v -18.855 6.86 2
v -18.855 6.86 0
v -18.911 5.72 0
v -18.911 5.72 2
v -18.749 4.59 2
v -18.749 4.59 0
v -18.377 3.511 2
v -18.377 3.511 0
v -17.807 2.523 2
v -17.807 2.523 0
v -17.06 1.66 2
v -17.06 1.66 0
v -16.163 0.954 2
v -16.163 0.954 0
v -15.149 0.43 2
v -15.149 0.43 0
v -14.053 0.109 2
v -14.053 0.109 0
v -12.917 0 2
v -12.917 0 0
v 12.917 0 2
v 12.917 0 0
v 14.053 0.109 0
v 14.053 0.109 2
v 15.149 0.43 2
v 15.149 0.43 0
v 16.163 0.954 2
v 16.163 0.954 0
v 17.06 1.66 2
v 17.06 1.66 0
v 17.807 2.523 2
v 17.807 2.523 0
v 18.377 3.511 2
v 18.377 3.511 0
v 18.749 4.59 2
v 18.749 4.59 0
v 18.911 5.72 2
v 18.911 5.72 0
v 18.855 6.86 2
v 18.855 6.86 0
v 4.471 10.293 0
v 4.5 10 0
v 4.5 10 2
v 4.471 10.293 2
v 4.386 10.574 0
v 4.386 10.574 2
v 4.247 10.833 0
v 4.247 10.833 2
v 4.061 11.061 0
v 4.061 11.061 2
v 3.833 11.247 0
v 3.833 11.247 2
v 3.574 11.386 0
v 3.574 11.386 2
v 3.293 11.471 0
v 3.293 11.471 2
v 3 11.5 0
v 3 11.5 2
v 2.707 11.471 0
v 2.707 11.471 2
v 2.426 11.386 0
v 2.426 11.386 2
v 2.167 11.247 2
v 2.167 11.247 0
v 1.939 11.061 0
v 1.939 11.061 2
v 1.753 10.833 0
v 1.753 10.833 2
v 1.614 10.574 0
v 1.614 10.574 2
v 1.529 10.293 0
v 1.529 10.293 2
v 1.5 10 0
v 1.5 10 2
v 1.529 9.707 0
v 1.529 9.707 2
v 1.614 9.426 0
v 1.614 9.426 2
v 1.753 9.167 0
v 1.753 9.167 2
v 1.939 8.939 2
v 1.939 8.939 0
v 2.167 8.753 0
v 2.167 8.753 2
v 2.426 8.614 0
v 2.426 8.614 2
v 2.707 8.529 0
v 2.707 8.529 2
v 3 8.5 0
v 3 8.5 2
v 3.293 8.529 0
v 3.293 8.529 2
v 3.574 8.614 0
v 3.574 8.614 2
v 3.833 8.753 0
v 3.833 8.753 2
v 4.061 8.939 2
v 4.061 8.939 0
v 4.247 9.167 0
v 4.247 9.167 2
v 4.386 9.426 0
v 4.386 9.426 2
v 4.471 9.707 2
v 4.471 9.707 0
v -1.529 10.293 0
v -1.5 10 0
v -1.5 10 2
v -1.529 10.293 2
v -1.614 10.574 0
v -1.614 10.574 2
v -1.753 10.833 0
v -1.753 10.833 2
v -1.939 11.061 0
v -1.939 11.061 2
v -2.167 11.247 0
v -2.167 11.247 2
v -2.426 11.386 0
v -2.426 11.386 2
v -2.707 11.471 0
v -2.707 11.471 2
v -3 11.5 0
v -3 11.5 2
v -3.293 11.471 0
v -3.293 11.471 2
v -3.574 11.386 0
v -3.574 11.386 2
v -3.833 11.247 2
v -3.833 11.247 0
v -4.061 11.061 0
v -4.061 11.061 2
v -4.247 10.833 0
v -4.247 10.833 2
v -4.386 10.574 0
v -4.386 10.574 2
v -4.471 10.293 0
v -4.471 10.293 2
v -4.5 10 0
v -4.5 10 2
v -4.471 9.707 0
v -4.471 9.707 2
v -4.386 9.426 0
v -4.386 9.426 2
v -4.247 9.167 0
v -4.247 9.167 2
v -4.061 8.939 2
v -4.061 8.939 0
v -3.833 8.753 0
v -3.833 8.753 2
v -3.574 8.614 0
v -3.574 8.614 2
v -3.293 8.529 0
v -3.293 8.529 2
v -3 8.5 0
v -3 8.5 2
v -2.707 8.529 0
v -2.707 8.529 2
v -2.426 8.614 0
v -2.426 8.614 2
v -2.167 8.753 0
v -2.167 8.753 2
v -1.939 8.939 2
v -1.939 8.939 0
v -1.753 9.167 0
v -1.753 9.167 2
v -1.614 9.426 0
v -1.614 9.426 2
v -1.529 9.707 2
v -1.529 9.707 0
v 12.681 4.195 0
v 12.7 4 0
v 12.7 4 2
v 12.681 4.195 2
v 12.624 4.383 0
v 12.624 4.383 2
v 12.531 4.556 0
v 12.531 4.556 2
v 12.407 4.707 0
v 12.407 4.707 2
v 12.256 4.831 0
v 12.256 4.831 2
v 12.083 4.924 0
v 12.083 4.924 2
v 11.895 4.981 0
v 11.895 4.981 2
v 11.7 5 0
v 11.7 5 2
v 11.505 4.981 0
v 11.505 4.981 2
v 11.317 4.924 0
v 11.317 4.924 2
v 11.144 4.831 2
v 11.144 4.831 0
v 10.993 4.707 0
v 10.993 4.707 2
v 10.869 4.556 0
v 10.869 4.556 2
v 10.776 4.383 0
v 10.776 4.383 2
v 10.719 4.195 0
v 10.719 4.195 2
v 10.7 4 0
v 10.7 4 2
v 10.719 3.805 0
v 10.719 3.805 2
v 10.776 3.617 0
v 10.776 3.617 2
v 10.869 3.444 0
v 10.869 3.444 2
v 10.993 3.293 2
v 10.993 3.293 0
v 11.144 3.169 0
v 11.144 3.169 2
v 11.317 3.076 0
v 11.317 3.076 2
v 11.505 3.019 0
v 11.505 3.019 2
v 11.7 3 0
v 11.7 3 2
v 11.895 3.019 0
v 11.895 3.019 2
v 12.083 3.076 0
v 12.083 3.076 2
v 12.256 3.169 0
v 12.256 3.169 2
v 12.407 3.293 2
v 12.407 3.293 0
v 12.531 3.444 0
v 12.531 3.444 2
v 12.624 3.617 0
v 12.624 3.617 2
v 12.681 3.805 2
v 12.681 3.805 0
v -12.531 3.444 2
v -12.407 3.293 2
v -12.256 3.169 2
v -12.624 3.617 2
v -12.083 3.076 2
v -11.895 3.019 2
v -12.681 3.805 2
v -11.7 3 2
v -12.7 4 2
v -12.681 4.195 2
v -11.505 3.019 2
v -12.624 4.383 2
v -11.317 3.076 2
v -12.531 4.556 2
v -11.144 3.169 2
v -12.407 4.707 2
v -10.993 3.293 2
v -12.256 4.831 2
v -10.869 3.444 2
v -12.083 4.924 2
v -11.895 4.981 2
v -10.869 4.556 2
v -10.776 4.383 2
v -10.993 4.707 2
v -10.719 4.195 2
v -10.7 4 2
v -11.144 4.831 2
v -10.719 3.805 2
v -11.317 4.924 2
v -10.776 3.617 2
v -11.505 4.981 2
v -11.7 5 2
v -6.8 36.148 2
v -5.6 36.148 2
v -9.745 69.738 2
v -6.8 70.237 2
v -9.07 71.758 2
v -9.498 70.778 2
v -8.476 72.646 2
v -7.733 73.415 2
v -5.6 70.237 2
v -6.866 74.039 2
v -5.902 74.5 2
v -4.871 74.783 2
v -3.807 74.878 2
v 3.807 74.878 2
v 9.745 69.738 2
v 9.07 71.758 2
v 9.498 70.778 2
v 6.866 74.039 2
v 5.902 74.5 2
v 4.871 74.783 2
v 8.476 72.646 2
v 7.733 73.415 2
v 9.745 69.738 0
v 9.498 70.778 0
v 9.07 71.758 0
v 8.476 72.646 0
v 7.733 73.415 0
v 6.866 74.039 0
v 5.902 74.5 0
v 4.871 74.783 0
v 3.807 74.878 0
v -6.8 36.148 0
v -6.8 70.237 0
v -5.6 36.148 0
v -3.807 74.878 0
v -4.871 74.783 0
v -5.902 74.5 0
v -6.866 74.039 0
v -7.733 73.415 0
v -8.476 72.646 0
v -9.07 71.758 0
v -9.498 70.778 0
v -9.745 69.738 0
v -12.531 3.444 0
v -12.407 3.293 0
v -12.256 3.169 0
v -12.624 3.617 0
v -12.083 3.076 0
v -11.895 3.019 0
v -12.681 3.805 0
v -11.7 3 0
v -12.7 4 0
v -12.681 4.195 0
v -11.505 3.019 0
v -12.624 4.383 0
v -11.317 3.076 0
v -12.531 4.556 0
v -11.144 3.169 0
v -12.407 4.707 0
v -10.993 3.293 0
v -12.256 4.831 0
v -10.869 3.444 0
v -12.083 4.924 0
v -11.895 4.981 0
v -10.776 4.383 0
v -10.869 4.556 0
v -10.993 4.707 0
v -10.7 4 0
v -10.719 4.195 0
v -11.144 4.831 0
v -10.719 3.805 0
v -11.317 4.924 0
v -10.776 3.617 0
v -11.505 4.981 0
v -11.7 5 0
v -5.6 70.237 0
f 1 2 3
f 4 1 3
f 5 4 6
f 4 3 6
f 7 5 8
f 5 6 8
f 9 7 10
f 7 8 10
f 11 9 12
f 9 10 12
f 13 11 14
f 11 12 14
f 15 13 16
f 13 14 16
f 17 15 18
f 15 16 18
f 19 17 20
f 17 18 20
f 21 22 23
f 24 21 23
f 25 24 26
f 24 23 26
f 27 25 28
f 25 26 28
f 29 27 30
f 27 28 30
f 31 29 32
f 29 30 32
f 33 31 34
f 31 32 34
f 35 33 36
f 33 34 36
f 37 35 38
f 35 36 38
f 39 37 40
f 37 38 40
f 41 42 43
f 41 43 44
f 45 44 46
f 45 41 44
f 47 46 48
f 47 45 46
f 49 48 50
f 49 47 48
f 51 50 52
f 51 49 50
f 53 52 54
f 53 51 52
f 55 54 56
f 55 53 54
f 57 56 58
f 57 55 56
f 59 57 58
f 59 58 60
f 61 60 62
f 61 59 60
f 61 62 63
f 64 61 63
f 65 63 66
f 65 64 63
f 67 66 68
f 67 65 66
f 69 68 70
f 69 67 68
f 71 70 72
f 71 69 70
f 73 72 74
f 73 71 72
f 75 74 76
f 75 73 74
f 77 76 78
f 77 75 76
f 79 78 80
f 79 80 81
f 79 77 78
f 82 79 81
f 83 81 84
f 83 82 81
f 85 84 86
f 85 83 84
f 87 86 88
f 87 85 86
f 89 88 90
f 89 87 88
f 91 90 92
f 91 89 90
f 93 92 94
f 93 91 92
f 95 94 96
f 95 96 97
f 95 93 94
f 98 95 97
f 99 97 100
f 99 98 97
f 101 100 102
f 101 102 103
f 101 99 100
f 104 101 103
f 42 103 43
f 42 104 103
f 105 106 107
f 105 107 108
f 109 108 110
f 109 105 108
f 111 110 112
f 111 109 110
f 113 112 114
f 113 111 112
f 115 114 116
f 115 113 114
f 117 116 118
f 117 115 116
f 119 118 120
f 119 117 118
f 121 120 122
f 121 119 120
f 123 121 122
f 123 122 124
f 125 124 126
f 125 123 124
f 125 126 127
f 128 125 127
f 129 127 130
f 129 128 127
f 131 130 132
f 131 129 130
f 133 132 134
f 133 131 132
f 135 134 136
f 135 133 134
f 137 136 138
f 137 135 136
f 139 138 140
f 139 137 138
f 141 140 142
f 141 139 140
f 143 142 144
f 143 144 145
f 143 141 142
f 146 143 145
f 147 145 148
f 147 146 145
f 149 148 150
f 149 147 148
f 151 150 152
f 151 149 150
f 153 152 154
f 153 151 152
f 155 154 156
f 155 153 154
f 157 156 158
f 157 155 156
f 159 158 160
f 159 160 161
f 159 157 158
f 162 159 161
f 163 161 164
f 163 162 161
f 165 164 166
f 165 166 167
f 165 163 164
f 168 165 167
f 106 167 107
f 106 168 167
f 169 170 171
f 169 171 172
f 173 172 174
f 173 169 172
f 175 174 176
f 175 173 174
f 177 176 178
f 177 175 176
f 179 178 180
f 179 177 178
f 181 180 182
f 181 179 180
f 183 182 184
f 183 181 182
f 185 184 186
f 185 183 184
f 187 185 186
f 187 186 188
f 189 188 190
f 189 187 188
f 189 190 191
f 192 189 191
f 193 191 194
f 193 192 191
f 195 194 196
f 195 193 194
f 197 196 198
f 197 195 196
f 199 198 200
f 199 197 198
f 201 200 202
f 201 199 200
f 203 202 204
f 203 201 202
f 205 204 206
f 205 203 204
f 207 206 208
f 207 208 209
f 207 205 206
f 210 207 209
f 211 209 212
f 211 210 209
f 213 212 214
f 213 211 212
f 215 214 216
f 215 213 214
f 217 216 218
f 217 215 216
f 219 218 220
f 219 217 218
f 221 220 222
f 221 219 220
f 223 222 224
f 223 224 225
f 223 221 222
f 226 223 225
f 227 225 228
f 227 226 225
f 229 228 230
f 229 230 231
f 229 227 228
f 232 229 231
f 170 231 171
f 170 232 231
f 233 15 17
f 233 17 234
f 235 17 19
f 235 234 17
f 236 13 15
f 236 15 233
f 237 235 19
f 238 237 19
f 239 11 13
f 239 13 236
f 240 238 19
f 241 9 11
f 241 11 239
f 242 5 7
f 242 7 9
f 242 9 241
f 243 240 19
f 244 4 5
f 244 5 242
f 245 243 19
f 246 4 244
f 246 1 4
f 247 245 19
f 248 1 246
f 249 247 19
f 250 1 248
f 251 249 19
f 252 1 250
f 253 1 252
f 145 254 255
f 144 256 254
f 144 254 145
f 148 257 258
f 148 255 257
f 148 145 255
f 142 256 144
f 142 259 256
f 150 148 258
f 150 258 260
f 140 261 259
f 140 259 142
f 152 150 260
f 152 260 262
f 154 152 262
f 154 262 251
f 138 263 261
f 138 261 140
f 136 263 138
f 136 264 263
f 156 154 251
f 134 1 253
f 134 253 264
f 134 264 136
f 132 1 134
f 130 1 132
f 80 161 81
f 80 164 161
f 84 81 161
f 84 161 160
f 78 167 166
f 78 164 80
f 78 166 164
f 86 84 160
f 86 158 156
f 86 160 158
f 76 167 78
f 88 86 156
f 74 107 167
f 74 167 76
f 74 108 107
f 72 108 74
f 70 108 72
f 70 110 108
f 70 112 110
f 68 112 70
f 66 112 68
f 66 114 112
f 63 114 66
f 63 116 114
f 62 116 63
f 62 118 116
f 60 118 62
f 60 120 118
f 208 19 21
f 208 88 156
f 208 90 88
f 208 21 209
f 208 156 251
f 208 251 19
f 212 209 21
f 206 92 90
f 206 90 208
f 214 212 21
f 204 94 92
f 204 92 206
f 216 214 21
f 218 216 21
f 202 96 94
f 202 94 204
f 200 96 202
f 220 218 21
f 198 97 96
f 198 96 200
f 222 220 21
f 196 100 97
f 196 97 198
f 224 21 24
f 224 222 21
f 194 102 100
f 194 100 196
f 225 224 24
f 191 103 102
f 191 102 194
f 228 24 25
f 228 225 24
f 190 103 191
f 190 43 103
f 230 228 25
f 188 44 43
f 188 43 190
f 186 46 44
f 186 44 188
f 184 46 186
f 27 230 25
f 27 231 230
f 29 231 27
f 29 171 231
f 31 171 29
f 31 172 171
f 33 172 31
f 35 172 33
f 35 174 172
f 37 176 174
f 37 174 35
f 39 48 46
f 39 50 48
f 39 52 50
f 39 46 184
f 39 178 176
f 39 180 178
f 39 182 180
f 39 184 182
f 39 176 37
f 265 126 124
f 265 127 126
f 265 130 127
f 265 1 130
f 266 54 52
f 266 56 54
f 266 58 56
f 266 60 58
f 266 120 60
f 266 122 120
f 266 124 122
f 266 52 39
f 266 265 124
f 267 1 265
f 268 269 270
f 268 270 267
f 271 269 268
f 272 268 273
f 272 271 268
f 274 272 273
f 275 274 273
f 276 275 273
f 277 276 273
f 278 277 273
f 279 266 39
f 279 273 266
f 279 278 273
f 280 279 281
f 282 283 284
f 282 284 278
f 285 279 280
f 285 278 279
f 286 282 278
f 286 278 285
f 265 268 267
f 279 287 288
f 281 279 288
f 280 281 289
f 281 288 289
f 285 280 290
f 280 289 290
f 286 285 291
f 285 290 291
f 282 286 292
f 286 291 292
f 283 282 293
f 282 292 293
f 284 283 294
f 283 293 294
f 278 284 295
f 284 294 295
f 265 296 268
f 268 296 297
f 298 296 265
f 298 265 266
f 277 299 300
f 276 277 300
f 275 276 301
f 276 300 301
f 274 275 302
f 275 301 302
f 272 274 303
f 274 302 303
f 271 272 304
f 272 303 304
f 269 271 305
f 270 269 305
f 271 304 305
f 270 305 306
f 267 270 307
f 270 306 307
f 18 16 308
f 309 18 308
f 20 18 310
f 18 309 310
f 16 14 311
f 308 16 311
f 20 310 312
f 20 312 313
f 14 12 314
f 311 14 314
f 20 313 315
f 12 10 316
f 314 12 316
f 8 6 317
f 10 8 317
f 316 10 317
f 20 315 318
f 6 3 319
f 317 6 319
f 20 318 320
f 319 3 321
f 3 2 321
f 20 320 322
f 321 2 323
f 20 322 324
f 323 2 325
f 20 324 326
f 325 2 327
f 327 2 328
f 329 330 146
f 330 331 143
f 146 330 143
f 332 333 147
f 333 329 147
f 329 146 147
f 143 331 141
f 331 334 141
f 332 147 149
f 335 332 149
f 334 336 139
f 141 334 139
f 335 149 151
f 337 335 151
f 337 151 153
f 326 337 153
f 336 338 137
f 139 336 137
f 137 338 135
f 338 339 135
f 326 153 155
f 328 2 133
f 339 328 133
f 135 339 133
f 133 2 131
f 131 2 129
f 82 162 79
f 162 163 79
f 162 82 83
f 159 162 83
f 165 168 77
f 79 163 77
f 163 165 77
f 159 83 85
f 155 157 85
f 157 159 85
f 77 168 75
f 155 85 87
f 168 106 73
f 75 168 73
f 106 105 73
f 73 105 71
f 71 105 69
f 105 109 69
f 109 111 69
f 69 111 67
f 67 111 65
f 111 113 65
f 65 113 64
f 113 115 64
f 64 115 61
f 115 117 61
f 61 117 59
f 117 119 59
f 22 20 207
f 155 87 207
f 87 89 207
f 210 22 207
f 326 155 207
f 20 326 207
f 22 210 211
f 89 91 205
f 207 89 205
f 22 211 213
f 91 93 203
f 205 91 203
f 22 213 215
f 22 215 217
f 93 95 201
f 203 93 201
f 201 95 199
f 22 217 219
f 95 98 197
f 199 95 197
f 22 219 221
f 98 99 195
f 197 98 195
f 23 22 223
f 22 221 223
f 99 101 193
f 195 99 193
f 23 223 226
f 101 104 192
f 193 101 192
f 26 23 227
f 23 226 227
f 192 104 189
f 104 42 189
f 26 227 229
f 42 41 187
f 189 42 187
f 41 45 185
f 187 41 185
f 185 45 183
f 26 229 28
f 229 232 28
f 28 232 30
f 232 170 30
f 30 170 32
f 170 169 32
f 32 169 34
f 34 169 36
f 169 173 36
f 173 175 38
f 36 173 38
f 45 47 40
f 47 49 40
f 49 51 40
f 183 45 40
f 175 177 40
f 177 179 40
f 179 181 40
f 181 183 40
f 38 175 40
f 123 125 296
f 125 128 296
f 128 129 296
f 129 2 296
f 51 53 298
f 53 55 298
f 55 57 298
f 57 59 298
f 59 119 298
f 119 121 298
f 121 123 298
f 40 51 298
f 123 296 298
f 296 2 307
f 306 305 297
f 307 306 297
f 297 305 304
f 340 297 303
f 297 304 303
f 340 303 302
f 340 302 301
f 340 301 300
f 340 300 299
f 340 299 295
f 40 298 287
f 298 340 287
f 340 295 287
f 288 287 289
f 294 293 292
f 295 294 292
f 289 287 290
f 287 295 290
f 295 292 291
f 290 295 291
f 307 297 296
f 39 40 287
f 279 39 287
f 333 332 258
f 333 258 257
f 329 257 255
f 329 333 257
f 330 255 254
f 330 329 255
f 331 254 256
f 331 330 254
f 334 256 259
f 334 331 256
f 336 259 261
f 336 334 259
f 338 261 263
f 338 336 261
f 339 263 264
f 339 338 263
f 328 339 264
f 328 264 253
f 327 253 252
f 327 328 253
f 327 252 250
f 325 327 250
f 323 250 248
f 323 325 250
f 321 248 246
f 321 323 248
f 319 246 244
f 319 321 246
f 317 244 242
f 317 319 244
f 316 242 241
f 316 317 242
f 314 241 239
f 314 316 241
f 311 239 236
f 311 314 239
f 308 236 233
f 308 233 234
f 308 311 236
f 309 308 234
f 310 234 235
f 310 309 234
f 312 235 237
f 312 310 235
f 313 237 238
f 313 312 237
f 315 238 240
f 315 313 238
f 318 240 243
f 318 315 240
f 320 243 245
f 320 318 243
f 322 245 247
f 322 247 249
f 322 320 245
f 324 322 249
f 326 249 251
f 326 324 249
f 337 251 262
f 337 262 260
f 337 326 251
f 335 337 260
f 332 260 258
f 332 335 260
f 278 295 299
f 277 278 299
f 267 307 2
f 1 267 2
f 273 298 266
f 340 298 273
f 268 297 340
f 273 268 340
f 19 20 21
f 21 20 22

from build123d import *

# Parameters (mm, degrees)
SKETCH_1_R      = 1
SKETCH_1_R_2    = 1.5
SKETCH_1_W      = 1.2
SKETCH_1_H      = 34.088931988
EXTRUDE_1_DEPTH = 2


with BuildPart() as part:
    # 草图1 → 凸台-拉伸1 (new body)
    with BuildSketch(Plane.XY):
        with BuildLine():
            Line((-12.91723747, 0), (12.91723747, 0))
            ThreePointArc((12.91723747, 0), (17.453878353, 2.073310619), (18.855230664, 6.860370167))
            Line((18.855230664, 6.860370167), (9.744693373, 69.738315612))
            ThreePointArc((9.744693373, 69.738315612), (7.73338956, 73.414586328), (3.806700178, 74.877945445))
            Line((3.806700178, 74.877945445), (0, 74.877945445))
            Line((0, 74.877945445), (-3.806700178, 74.877945445))
            ThreePointArc((-3.806700178, 74.877945445), (-7.73338956, 73.414586328), (-9.744693373, 69.738315612))
            Line((-9.744693373, 69.738315612), (-18.855230664, 6.860370167))
            ThreePointArc((-18.855230664, 6.860370167), (-17.453878353, 2.073310619), (-12.91723747, 0))
        make_face()
        with Locations((11.7, 4)):
            Circle(SKETCH_1_R, mode=Mode.SUBTRACT)
        with Locations((-11.7, 4)):
            Circle(SKETCH_1_R, mode=Mode.SUBTRACT)
        with Locations((-3, 10)):
            Circle(SKETCH_1_R_2, mode=Mode.SUBTRACT)
        with Locations((3, 10)):
            Circle(SKETCH_1_R_2, mode=Mode.SUBTRACT)
        with Locations((-6.2, 53.192179666)):
            Rectangle(SKETCH_1_W, SKETCH_1_H, mode=Mode.SUBTRACT)
    extrude(amount=EXTRUDE_1_DEPTH)


solid = part.part
